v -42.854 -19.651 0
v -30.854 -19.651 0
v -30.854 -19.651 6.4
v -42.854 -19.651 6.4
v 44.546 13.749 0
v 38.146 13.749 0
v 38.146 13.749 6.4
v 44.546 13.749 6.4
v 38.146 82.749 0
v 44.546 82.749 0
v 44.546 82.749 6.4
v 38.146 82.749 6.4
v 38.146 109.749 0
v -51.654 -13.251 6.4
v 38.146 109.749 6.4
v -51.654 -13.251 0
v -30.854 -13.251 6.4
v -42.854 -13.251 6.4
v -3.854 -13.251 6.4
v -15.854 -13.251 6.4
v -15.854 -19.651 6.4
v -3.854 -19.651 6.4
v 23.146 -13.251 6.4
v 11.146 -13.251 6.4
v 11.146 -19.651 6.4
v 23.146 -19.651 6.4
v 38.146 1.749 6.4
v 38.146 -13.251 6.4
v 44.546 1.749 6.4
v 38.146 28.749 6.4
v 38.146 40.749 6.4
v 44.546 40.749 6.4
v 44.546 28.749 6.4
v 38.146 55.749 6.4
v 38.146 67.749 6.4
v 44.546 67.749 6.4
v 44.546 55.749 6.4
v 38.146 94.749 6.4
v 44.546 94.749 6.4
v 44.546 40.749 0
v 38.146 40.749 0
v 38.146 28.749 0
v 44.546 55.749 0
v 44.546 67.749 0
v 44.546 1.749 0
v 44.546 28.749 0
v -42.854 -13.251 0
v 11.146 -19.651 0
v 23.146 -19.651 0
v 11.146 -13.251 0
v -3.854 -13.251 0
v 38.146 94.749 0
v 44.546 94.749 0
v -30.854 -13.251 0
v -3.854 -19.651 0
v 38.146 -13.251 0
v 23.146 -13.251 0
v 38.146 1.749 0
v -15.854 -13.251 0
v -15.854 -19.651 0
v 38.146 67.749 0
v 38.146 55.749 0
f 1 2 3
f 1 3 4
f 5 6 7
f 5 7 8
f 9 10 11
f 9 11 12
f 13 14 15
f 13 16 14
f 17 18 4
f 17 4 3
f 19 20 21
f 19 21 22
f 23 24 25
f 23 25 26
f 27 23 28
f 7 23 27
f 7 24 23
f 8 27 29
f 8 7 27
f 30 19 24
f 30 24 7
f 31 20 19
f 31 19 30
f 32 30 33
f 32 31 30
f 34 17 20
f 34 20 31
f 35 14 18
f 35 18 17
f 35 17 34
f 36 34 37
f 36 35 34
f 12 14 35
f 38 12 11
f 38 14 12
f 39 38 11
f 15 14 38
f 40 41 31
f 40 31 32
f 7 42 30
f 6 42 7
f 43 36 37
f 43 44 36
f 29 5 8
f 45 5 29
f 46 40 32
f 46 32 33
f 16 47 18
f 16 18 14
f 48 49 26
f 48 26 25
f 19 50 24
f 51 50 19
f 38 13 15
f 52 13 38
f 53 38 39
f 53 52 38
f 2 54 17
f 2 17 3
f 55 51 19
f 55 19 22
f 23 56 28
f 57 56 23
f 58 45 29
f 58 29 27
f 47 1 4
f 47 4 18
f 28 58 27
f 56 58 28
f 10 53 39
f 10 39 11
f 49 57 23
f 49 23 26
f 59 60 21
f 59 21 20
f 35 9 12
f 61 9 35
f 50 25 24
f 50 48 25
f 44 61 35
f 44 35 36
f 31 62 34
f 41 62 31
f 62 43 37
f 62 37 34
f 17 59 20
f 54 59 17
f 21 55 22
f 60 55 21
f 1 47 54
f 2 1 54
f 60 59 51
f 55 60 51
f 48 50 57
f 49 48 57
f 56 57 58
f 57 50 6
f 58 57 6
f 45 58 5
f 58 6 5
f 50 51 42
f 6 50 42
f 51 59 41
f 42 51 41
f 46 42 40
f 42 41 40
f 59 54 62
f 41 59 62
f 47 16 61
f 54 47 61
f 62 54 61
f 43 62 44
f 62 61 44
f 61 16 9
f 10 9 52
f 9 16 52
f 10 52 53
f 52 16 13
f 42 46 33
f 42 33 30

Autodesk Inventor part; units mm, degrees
ref_plane "YZ Plane" through (0, 0, 0) normal (1, 0, 0) x (0, 1, 0)
ref_plane "XZ Plane" through (0, 0, 0) normal (0, 1, 0) x (-1, 0, 0)
ref_plane "XY Plane" through (0, 0, 0) normal (0, 0, 1) x (1, 0, 0)
sketch "Sketch1" plane through (0, 0, 0) normal (0, 0, 1) x (1, 0, 0)
  line L0 (-51.6543, 109.7487) -> (38.1457, 109.7487) construction
  line L1 (38.1457, -13.2513) -> (-51.6543, -13.2513) construction
  line L2 (-51.6543, -13.2513) -> (-51.6543, 109.7487) construction
  line L3 (38.1457, 94.7487) -> (44.5457, 94.7487)
  line L4 (44.5457, 94.7487) -> (44.5457, 82.7487)
  line L5 (44.5457, 82.7487) -> (38.1457, 82.7487)
  line L6 (38.1457, 82.7487) -> (38.1457, 94.7487)
  line L7 (44.5457, 67.7487) -> (44.5457, 55.7487)
  line L8 (44.5457, 55.7487) -> (38.1457, 55.7487)
  line L9 (38.1457, 55.7487) -> (38.1457, 67.7487)
  line L10 (38.1457, 67.7487) -> (44.5457, 67.7487)
  line L11 (44.5457, 40.7487) -> (44.5457, 28.7487)
  line L12 (44.5457, 28.7487) -> (38.1457, 28.7487)
  line L13 (38.1457, 28.7487) -> (38.1457, 40.7487)
  line L14 (38.1457, 40.7487) -> (44.5457, 40.7487)
  line L15 (44.5457, 13.7487) -> (44.5457, 1.7487)
  line L16 (44.5457, 1.7487) -> (38.1457, 1.7487)
  line L17 (38.1457, 1.7487) -> (38.1457, 13.7487)
  line L18 (38.1457, 13.7487) -> (44.5457, 13.7487)
  line L19 (38.1457, 109.7487) -> (38.1457, -13.2513)
  line L20 (38.1457, -13.2513) -> (-51.6543, -13.2513)
  line L21 (11.1457, -13.2513) -> (23.1457, -13.2513)
  line L22 (23.1457, -13.2513) -> (23.1457, -19.6513)
  line L23 (23.1457, -19.6513) -> (11.1457, -19.6513)
  line L24 (11.1457, -19.6513) -> (11.1457, -13.2513)
  line L25 (-15.8543, -19.6513) -> (-15.8543, -13.2513)
  line L26 (-3.8543, -19.6513) -> (-15.8543, -19.6513)
  line L27 (-3.8543, -13.2513) -> (-3.8543, -19.6513)
  line L28 (-42.8543, -19.6513) -> (-42.8543, -13.2513)
  line L29 (-30.8543, -19.6513) -> (-42.8543, -19.6513)
  line L30 (-30.8543, -13.2513) -> (-30.8543, -19.6513)
  line L31 (-51.6543, -13.2513) -> (38.1457, 109.7487)
  point P0 (0, 0)
  dimension "d0" = 89.8
  dimension "d1" = 123
  dimension "d2" = 12
  dimension "d3" = 6.4
  dimension "d4" = 15
  dimension "d7" = 27
  dimension "d12" = 12
  dimension "d13" = 6.4
  dimension "d14" = 15
  dimension "d17" = 27
extrude "Extrusion1" add sketch "Sketch1" along normal blind 6.4
properties part number "mdf_support"
